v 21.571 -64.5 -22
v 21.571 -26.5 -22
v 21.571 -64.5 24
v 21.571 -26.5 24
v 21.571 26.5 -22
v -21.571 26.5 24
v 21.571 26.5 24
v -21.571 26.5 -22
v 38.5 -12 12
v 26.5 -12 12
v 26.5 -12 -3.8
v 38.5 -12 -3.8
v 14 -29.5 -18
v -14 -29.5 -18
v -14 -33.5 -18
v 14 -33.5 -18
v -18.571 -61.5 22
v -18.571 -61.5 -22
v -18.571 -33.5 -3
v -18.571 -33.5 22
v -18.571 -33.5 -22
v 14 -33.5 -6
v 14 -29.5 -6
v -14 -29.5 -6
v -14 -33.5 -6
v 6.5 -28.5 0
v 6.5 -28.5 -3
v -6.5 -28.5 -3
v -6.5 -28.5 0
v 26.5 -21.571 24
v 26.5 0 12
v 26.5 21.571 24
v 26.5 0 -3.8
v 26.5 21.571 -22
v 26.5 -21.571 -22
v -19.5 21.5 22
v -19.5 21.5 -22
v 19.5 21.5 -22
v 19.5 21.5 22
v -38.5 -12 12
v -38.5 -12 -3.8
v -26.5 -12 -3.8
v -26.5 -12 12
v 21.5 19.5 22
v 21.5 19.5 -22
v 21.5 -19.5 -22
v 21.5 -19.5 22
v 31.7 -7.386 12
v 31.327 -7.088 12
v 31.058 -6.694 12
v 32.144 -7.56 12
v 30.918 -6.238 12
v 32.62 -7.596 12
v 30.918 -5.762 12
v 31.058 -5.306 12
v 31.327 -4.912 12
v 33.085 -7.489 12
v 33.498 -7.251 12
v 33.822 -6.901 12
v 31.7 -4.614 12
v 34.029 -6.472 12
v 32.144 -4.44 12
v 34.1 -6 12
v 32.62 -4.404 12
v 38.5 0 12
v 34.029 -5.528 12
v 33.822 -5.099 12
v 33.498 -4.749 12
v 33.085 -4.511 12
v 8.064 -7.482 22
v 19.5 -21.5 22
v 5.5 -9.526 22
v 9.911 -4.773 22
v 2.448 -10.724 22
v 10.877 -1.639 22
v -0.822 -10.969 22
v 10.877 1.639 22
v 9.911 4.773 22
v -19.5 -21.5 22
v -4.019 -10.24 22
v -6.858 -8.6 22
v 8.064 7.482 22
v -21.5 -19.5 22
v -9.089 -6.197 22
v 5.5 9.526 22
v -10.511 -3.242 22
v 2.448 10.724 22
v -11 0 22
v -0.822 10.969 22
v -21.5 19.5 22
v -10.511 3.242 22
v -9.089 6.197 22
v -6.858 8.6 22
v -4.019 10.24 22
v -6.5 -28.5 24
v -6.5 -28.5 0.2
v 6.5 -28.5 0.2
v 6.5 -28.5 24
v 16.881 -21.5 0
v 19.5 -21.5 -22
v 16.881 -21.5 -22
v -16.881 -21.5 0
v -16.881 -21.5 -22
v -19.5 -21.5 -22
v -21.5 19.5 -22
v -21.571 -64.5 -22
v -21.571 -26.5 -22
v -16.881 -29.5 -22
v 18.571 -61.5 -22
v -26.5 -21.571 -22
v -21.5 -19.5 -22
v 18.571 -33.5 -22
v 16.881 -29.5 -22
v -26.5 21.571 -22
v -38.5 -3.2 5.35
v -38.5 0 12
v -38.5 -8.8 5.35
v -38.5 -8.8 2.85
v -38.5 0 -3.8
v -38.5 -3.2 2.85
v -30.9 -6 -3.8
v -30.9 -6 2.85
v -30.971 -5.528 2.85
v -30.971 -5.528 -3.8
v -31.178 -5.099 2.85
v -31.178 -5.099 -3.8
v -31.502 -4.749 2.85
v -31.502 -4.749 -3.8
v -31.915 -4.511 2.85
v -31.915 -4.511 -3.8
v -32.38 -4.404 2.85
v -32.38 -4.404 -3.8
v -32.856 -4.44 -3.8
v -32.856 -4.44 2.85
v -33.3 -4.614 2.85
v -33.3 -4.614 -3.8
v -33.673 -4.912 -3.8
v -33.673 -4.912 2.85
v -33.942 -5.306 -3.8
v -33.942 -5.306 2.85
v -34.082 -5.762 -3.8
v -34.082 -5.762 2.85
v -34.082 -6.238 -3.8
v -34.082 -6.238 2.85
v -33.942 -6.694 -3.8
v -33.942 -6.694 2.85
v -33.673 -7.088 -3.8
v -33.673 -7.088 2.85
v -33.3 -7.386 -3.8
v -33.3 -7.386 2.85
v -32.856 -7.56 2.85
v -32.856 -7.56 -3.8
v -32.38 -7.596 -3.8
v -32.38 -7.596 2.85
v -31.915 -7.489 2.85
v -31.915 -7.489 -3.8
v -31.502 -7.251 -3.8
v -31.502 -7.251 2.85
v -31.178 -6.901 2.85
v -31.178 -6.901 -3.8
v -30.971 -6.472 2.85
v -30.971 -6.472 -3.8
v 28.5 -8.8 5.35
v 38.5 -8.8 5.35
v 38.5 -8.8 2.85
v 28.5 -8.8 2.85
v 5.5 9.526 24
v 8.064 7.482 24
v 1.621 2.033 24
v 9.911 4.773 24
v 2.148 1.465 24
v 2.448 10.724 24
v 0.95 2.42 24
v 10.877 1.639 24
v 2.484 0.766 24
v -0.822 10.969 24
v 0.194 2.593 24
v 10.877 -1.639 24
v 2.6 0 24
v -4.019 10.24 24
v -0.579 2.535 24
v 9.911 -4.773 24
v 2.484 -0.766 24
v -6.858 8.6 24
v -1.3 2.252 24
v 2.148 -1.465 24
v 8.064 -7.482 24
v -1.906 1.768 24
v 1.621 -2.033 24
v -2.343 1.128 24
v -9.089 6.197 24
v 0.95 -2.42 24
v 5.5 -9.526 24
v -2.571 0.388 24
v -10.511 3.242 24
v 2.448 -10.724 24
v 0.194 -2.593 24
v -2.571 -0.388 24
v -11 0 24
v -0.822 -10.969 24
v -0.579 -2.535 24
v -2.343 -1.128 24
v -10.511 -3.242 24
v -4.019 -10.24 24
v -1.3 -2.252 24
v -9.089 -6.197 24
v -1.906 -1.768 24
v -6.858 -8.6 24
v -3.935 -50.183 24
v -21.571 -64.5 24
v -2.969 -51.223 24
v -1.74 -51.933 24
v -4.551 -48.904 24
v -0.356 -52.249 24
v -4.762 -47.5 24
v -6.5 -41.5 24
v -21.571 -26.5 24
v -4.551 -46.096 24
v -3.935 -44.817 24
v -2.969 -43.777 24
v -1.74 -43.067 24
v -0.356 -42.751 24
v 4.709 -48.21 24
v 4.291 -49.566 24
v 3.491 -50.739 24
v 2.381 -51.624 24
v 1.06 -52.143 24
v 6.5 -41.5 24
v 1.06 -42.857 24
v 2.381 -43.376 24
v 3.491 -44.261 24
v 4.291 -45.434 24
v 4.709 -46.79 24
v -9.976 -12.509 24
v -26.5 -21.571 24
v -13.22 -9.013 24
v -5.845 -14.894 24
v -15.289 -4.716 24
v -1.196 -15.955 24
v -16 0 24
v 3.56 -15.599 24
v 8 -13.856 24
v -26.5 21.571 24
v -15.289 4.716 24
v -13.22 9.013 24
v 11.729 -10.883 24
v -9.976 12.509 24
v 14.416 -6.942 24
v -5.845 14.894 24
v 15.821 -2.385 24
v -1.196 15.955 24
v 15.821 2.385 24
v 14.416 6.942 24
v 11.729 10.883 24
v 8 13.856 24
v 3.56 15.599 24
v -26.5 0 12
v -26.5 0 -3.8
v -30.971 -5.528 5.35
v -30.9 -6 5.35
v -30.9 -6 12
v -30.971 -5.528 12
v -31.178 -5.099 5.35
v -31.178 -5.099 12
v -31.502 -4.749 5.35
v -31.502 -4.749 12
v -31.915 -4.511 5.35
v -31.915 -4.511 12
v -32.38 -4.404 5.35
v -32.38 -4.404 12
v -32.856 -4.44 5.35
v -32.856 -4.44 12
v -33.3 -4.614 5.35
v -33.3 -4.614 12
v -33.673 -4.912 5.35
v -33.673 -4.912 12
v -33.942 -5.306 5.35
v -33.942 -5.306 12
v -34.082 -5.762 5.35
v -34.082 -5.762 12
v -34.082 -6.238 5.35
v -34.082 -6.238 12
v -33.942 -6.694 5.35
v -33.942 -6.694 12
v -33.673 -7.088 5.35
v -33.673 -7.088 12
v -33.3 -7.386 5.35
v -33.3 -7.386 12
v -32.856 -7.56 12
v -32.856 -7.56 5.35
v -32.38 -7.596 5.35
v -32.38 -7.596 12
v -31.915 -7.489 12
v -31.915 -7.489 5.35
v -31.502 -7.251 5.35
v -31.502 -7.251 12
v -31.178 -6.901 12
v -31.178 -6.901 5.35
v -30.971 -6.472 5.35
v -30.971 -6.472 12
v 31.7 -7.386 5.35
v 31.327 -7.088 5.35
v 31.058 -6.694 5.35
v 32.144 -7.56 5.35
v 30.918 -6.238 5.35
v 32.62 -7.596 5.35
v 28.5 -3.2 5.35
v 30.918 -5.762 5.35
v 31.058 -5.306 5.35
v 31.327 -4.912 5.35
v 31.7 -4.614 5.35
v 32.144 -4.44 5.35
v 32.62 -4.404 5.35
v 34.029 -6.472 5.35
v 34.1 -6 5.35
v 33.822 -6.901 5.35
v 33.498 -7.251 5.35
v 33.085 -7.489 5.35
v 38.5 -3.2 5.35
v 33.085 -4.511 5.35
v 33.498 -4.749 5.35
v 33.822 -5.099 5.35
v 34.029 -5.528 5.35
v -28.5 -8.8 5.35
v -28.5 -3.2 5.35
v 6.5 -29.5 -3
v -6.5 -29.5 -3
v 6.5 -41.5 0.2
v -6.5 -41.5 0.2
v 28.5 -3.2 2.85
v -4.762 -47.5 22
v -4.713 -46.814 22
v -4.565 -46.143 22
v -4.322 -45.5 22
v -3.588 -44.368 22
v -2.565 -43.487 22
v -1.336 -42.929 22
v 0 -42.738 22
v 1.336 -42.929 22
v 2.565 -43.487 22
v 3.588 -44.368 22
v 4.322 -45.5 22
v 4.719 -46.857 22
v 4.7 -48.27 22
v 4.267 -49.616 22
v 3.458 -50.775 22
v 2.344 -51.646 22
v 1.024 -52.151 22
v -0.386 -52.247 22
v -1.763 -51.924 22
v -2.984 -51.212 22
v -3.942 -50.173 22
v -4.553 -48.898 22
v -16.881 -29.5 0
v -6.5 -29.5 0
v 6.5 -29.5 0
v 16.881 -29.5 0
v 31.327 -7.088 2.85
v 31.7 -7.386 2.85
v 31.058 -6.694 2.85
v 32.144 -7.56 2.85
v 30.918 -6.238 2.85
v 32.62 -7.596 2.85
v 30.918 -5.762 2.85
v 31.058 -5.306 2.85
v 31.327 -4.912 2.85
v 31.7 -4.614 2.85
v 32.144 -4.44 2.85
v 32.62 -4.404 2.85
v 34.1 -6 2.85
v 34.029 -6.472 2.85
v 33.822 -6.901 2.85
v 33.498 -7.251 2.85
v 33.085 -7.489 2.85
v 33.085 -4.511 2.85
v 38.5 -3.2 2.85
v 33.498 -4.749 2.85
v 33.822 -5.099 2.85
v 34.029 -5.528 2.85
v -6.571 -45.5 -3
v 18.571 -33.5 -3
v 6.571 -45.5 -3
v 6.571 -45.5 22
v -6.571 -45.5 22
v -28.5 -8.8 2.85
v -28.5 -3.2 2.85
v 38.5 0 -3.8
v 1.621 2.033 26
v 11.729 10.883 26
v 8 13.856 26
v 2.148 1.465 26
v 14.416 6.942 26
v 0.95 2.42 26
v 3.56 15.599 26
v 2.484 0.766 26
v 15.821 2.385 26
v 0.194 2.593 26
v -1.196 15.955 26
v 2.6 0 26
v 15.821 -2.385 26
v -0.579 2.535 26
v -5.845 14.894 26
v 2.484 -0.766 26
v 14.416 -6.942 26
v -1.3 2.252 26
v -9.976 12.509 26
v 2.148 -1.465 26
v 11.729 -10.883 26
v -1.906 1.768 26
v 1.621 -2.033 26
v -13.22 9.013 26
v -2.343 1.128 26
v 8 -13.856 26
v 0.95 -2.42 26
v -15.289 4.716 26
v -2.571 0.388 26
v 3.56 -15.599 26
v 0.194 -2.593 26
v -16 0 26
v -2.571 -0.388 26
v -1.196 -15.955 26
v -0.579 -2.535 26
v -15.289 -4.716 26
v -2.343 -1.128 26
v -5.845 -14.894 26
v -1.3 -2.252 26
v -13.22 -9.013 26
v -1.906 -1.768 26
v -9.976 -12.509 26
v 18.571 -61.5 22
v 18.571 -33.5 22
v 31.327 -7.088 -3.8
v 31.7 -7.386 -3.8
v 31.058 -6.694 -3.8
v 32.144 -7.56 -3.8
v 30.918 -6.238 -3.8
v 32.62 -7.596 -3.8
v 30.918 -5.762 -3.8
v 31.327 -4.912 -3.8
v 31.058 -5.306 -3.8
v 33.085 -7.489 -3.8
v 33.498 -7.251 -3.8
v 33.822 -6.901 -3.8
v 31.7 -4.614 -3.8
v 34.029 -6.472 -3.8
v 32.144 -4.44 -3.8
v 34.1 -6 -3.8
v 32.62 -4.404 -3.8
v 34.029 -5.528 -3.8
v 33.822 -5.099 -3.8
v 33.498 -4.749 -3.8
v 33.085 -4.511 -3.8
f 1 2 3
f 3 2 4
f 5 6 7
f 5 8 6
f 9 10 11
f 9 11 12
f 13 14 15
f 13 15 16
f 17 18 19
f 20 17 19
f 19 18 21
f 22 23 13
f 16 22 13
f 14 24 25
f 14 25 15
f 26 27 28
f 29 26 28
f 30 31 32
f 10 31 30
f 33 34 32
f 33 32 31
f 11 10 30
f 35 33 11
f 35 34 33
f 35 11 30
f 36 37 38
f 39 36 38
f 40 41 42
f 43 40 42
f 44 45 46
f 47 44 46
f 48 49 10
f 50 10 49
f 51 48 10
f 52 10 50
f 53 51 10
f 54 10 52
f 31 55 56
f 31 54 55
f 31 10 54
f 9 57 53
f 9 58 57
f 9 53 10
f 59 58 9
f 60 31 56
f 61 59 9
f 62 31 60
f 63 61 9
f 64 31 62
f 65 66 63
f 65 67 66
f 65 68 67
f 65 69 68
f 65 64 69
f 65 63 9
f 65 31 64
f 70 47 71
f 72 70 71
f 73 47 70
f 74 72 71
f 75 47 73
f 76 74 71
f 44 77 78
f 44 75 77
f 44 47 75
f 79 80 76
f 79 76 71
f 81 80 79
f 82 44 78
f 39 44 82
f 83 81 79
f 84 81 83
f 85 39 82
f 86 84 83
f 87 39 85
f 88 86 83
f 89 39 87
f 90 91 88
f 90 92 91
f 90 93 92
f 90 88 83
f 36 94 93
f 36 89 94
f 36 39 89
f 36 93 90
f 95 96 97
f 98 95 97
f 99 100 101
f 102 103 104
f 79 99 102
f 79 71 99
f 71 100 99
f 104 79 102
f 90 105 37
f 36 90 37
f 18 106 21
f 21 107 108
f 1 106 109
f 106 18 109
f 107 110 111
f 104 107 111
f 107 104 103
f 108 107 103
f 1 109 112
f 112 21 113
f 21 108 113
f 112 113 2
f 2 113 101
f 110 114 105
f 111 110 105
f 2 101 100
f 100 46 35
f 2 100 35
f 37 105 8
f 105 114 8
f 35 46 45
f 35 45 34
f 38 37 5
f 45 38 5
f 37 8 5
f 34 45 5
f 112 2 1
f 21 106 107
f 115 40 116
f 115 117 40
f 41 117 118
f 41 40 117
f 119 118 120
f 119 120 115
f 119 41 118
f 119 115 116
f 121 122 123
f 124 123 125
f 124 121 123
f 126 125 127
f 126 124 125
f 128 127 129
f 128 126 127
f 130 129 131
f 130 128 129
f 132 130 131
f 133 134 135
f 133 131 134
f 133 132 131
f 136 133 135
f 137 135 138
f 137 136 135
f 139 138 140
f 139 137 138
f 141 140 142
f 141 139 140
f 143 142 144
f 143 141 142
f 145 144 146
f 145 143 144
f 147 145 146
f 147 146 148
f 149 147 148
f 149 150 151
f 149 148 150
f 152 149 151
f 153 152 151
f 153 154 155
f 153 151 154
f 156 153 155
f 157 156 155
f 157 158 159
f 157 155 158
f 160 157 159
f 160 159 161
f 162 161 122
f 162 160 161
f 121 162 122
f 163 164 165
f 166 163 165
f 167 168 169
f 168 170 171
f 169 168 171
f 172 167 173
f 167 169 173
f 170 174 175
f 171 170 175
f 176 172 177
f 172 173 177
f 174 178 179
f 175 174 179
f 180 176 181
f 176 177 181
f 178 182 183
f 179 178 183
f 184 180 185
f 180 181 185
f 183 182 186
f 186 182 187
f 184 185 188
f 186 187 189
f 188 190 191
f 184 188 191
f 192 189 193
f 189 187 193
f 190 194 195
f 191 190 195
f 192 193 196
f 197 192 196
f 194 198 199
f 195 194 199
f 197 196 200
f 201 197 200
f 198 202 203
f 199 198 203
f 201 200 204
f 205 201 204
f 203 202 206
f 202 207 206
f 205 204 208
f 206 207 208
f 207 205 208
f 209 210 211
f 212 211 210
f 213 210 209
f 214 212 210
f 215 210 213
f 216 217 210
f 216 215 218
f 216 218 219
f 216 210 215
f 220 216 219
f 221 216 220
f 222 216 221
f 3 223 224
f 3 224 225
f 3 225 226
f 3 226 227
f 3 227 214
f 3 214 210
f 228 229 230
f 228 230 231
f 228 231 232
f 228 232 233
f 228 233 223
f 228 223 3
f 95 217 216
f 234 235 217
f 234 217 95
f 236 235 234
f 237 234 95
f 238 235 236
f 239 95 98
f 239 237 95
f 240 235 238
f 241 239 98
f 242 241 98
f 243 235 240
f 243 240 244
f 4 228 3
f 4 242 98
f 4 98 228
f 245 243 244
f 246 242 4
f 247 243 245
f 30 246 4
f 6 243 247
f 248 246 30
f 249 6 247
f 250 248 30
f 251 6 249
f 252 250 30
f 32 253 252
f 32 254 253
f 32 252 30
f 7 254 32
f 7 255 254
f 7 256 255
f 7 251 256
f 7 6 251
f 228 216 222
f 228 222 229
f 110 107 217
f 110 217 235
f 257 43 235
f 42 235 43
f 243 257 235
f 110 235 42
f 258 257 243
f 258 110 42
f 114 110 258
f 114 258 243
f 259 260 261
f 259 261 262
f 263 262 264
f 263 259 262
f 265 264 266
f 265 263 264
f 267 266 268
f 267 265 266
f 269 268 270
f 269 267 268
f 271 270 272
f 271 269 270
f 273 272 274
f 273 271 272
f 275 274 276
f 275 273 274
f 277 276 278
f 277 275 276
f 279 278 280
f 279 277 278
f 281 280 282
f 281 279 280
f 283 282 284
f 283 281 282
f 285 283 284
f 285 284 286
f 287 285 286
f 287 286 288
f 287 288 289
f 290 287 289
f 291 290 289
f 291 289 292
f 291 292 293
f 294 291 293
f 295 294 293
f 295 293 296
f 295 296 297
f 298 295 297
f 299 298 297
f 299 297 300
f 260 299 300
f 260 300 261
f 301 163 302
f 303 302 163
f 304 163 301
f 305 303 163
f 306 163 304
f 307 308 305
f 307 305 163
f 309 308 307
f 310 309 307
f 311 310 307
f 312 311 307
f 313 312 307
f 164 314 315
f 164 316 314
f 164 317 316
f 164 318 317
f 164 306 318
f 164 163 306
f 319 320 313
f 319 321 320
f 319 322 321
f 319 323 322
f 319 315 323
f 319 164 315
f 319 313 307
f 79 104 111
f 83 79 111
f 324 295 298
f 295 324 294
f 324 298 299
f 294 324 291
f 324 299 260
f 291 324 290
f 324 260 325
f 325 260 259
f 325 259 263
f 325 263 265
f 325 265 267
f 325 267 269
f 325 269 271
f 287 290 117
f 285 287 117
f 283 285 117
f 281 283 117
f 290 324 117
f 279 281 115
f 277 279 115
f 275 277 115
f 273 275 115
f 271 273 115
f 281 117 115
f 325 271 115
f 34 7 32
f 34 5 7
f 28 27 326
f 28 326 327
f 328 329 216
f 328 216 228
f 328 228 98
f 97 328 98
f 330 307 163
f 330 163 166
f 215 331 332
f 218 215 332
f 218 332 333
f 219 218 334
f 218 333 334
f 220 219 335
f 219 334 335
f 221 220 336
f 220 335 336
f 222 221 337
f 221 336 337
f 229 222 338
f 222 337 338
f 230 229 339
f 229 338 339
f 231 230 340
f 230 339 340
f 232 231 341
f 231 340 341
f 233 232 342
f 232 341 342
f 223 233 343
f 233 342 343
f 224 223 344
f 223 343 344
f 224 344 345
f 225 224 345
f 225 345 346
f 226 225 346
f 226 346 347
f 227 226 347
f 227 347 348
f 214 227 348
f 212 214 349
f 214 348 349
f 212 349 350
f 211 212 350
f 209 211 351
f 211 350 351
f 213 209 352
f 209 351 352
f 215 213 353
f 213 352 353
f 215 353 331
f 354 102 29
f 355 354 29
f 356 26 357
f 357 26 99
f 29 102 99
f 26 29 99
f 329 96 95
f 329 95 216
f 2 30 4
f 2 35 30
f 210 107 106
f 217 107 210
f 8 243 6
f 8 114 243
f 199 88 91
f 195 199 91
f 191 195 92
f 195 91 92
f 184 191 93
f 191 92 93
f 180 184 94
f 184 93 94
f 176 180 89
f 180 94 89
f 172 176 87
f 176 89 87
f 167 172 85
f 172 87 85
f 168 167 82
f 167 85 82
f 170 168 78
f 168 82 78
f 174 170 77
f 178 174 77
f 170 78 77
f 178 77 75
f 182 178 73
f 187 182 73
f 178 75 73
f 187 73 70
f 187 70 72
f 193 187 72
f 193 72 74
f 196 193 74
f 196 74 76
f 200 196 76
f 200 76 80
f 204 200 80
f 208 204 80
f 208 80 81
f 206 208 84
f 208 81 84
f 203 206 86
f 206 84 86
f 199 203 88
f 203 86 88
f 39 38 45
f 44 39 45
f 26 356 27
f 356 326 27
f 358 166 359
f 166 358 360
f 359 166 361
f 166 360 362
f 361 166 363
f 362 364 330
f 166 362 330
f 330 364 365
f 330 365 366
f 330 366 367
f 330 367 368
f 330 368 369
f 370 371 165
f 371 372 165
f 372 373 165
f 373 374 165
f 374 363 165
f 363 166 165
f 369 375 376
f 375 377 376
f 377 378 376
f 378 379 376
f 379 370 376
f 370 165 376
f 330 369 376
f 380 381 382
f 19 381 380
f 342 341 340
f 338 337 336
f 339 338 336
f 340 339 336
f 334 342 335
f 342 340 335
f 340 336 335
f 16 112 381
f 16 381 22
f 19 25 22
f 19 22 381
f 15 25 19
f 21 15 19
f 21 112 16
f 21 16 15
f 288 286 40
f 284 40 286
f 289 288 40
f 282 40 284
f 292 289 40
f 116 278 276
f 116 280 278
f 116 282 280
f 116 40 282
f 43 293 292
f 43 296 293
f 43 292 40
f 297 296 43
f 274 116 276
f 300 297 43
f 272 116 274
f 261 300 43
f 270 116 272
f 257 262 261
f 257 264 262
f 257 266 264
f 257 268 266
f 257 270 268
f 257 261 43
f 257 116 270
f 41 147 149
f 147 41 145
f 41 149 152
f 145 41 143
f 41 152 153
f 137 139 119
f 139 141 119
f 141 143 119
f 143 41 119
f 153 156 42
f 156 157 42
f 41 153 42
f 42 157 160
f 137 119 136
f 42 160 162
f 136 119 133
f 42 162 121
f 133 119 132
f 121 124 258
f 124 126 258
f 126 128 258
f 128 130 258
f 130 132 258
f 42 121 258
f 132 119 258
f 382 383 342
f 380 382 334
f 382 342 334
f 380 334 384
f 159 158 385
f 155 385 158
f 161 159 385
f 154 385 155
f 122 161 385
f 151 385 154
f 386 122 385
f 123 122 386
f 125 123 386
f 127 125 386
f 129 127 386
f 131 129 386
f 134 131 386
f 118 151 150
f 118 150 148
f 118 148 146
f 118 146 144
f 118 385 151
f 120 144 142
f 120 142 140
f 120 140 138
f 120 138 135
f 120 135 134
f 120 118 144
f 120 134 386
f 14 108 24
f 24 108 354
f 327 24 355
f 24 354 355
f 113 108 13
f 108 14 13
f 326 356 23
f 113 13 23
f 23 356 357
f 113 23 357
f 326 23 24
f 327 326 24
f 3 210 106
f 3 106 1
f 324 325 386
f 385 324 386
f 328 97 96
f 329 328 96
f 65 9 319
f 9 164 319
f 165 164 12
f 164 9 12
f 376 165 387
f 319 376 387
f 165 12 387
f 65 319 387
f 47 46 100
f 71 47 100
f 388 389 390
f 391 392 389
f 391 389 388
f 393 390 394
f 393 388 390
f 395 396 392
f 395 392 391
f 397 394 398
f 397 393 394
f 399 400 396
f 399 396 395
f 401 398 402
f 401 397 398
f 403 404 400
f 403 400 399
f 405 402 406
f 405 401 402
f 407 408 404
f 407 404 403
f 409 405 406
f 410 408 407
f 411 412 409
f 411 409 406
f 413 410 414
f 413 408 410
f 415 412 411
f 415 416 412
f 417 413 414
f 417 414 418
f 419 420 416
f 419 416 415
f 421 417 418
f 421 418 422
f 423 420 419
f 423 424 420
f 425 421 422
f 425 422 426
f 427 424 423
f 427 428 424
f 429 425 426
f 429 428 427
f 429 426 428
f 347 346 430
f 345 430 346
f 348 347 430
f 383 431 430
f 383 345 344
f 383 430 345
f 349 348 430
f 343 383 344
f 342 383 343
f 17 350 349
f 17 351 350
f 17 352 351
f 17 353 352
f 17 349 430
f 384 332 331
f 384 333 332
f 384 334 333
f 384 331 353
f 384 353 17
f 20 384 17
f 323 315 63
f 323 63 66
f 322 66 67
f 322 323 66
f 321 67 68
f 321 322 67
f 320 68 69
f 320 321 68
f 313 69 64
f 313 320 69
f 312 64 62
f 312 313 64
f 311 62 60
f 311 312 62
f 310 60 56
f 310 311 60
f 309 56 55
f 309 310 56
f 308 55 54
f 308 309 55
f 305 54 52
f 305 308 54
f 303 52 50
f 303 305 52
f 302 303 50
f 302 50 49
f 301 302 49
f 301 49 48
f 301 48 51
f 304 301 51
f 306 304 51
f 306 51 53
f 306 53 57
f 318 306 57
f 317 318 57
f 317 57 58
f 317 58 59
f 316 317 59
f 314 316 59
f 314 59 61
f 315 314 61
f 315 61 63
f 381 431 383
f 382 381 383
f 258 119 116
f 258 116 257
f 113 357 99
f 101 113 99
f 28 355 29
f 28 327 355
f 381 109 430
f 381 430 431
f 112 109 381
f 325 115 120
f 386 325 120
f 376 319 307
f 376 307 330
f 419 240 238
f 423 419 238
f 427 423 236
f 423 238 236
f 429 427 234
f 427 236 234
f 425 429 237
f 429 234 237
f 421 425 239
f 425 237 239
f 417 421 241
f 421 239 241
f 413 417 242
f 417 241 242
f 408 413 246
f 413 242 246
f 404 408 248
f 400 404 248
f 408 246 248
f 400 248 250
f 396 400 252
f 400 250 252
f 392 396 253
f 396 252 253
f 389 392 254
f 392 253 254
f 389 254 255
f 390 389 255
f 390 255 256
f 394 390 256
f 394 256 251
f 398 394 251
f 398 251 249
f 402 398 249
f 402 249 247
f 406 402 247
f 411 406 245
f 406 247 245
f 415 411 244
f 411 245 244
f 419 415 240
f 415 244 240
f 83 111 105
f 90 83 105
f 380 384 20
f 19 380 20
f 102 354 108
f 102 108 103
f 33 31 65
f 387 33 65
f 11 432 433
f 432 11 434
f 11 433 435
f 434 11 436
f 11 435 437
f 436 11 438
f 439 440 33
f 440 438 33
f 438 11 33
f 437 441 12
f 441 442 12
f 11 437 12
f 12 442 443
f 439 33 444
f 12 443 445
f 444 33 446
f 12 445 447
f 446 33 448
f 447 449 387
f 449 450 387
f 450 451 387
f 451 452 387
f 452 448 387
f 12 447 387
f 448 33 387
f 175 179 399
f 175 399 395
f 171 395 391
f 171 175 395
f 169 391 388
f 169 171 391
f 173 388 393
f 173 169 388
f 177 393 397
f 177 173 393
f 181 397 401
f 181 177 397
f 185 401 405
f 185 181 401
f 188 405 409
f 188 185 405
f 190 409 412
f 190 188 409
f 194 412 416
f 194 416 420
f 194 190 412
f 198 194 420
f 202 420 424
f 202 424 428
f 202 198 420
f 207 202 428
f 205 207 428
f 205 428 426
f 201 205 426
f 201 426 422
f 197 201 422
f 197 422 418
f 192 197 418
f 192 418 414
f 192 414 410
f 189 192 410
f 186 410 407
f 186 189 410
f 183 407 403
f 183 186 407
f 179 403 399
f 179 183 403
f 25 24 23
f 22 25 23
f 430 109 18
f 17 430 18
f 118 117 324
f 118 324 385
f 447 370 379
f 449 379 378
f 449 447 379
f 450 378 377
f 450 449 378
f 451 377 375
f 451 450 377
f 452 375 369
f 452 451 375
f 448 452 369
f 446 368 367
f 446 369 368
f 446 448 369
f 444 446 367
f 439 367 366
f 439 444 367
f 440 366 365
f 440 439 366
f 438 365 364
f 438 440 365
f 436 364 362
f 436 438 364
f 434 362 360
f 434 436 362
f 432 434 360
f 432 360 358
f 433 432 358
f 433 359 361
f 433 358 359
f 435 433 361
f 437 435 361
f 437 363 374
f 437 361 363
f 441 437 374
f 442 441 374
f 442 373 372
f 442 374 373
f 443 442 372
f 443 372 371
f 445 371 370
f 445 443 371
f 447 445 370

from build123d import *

# Parameters (mm, degrees)
SALIENTE_EXTRUIR1_DEPTH      = 22
CROQUIS2_W                   = 43.142135624
CROQUIS2_H                   = 44
SALIENTE_EXTRUIR2_DEPTH      = 8
CROQUIS3_W                   = 33.76116098
CROQUIS3_H                   = 8
CORTAR_EXTRUIR1_DEPTH        = 49.74935897
CROQUIS4_R                   = 11
SALIENTE_EXTRUIR4_DEPTH      = 2
CROQUIS7_R                   = 16
CROQUIS7_R_2                 = 2.6
SALIENTE_EXTRUIR5_DEPTH      = 2
CROQUIS6_W                   = 28
CROQUIS6_H                   = 12
CORTAR_EXTRUIR3_DEPTH        = 13
SALIENTE_EXTRUIR6_DEPTH      = 12
SALIENTE_EXTRUIR6_DEPTH_BACK = 3.8
CROQUIS8_W                   = 12
CROQUIS8_H                   = 12
CROQUIS8_R                   = 1.6
CROQUIS9_W                   = 2.5
CROQUIS9_H                   = 5.6
CORTAR_EXTRUIR4_DEPTH        = 10
CROQUIS11_W                  = 43.142135624
CROQUIS11_H                  = 46
SALIENTE_EXTRUIR8_DEPTH      = 30
CROQUIS12_W                  = 37.142135624
CROQUIS12_H                  = 28
CORTAR_EXTRUIR5_DEPTH        = 44
CROQUIS14_W                  = 13
CROQUIS14_H                  = 13
CORTAR_EXTRUIR7_DEPTH        = 25
CROQUIS13_R                  = 4.7625
CORTAR_EXTRUIR6_DEPTH        = 2
SALIENTE_EXTRUIR9_DEPTH      = 25
CROQUIS16_W                  = 13
CROQUIS16_H                  = 13
SALIENTE_EXTRUIR11_DEPTH     = 3.2


with BuildPart() as part:
    # Croquis1 → Saliente-Extruir1 (new, symmetric)
    with BuildSketch(Plane.XY):
        Polygon((26.5, -21.571067812), (26.5, 21.571067812), (21.571067812, 26.5), (-21.571067812, 26.5), (-26.5, 21.571067812), (-26.5, -21.571067812), (-21.571067812, -26.5), (21.571067812, -26.5), align=None)
        Polygon((-19.5, -21.5), (-21.5, -19.5), (-21.5, 19.5), (-19.5, 21.5), (19.5, 21.5), (21.5, 19.5), (21.5, -19.5), (19.5, -21.5), align=None, mode=Mode.SUBTRACT)
    extrude(amount=SALIENTE_EXTRUIR1_DEPTH, both=True)

    # Croquis2 → Saliente-Extruir2 (add)
    with BuildSketch(Plane.XZ.offset(26.5)):
        Rectangle(CROQUIS2_W, CROQUIS2_H)
    extrude(amount=SALIENTE_EXTRUIR2_DEPTH)

    # Croquis3 → Cortar-Extruir1 (cut, through all)
    with BuildSketch(Plane.XY):
        with Locations((0, -25.5)):
            Rectangle(CROQUIS3_W, CROQUIS3_H)
    extrude(amount=-CORTAR_EXTRUIR1_DEPTH, mode=Mode.SUBTRACT)

    # Croquis4 → Saliente-Extruir4 (add)
    with BuildSketch(Plane(origin=(0, 0, 22), x_dir=(-1, 0, 0), z_dir=(0, 0, -1))):
        Polygon((-26.5, -21.571067812), (-21.571067812, -26.5), (-21.571067812, -34.5), (21.571067812, -34.5), (21.571067812, -26.5), (26.5, -21.571067812), (26.5, 21.571067812), (21.571067812, 26.5), (-21.571067812, 26.5), (-26.5, 21.571067812), align=None)
        Circle(CROQUIS4_R, mode=Mode.SUBTRACT)
    extrude(amount=-SALIENTE_EXTRUIR4_DEPTH)

    # Croquis7 → Saliente-Extruir5 (add)
    with BuildSketch(Plane.XY.offset(24)):
        with Locations(Location((0, 0, 0), (0, 0, 180))):
            Circle(CROQUIS7_R)
        Circle(CROQUIS7_R_2, mode=Mode.SUBTRACT)
    extrude(amount=SALIENTE_EXTRUIR5_DEPTH)

    # Croquis6 → Cortar-Extruir3 (cut)
    with BuildSketch(Plane(origin=(0, -29.5, 0), x_dir=(1, 0, 0), z_dir=(0, 1, 0))):
        with Locations((0, 12)):
            Rectangle(CROQUIS6_W, CROQUIS6_H)
    extrude(amount=-CORTAR_EXTRUIR3_DEPTH, mode=Mode.SUBTRACT)

    # Croquis8 → Saliente-Extruir6 (add, two sides: drawn at the far end of the back side and taken through both)
    # profile 1 of 2: a face of its own
    with BuildSketch(Plane.XY.offset(-SALIENTE_EXTRUIR6_DEPTH_BACK)):
        with Locations((-32.5, -6)):
            Rectangle(CROQUIS8_W, CROQUIS8_H)
        with Locations((-32.5, -6)):
            Circle(CROQUIS8_R, mode=Mode.SUBTRACT)
    # profile 2 of 2: a face of its own
    with BuildSketch(Plane.XY.offset(-SALIENTE_EXTRUIR6_DEPTH_BACK)):
        with Locations((32.5, -6)):
            Rectangle(CROQUIS8_W, CROQUIS8_H)
        with Locations((32.5, -6)):
            Circle(CROQUIS8_R, mode=Mode.SUBTRACT)
    extrude(amount=SALIENTE_EXTRUIR6_DEPTH + SALIENTE_EXTRUIR6_DEPTH_BACK)

    # Croquis9 → Cortar-Extruir4 (cut)
    with BuildSketch(Plane(origin=(38.5, 0, 0), x_dir=(0, 0, -1), z_dir=(1, 0, 0))):
        with Locations((-4.1, -6)):
            Rectangle(CROQUIS9_W, CROQUIS9_H)
    cortar_extruir4 = extrude(amount=-CORTAR_EXTRUIR4_DEPTH, mode=Mode.SUBTRACT)

    # Simetría1: Cortar-Extruir4 across plane
    add(cortar_extruir4.mirror(Plane(origin=(0, 0, 0), x_dir=(0, 0, 1), z_dir=(1, 0, 0))), mode=Mode.SUBTRACT)

    # Croquis11 → Saliente-Extruir8 (add)
    with BuildSketch(Plane.XZ.offset(34.5)):
        with Locations((0, 1)):
            Rectangle(CROQUIS11_W, CROQUIS11_H)
    extrude(amount=SALIENTE_EXTRUIR8_DEPTH)

    # Croquis12 → Cortar-Extruir5 (cut)
    with BuildSketch(Plane(origin=(0, 0, -22), x_dir=(-1, 0, 0), z_dir=(0, 0, -1))):
        with Locations((0, -47.5)):
            Rectangle(CROQUIS12_W, CROQUIS12_H)
    extrude(amount=-CORTAR_EXTRUIR5_DEPTH, mode=Mode.SUBTRACT)

    # Croquis14 → Cortar-Extruir7 (cut)
    with BuildSketch(Plane.XY.offset(24)):
        with Locations((0, -35)):
            Rectangle(CROQUIS14_W, CROQUIS14_H)
    extrude(amount=-CORTAR_EXTRUIR7_DEPTH, mode=Mode.SUBTRACT)

    # Croquis13 → Cortar-Extruir6 (cut)
    with BuildSketch(Plane(origin=(0, 0, 22), x_dir=(-1, 0, 0), z_dir=(0, 0, -1))):
        with Locations((0, -47.5)):
            Circle(CROQUIS13_R)
    extrude(amount=-CORTAR_EXTRUIR6_DEPTH, mode=Mode.SUBTRACT)

    # Croquis15 → Saliente-Extruir9 (add)
    with BuildSketch(Plane(origin=(0, 0, 22), x_dir=(-1, 0, 0), z_dir=(0, 0, -1))):
        Polygon((-6.5, -33.5), (-18.571067812, -33.5), (-6.571067812, -45.5), (6.571067812, -45.5), (18.571067812, -33.5), (6.5, -33.5), (6.5, -41.5), (-6.5, -41.5), align=None)
    extrude(amount=SALIENTE_EXTRUIR9_DEPTH)

    # Croquis16 → Saliente-Extruir11 (add)
    with BuildSketch(Plane(origin=(0, 0, -3), x_dir=(-1, 0, 0), z_dir=(0, 0, -1))):
        with Locations((0, -35)):
            Rectangle(CROQUIS16_W, CROQUIS16_H)
    extrude(amount=-SALIENTE_EXTRUIR11_DEPTH)


solid = part.part
